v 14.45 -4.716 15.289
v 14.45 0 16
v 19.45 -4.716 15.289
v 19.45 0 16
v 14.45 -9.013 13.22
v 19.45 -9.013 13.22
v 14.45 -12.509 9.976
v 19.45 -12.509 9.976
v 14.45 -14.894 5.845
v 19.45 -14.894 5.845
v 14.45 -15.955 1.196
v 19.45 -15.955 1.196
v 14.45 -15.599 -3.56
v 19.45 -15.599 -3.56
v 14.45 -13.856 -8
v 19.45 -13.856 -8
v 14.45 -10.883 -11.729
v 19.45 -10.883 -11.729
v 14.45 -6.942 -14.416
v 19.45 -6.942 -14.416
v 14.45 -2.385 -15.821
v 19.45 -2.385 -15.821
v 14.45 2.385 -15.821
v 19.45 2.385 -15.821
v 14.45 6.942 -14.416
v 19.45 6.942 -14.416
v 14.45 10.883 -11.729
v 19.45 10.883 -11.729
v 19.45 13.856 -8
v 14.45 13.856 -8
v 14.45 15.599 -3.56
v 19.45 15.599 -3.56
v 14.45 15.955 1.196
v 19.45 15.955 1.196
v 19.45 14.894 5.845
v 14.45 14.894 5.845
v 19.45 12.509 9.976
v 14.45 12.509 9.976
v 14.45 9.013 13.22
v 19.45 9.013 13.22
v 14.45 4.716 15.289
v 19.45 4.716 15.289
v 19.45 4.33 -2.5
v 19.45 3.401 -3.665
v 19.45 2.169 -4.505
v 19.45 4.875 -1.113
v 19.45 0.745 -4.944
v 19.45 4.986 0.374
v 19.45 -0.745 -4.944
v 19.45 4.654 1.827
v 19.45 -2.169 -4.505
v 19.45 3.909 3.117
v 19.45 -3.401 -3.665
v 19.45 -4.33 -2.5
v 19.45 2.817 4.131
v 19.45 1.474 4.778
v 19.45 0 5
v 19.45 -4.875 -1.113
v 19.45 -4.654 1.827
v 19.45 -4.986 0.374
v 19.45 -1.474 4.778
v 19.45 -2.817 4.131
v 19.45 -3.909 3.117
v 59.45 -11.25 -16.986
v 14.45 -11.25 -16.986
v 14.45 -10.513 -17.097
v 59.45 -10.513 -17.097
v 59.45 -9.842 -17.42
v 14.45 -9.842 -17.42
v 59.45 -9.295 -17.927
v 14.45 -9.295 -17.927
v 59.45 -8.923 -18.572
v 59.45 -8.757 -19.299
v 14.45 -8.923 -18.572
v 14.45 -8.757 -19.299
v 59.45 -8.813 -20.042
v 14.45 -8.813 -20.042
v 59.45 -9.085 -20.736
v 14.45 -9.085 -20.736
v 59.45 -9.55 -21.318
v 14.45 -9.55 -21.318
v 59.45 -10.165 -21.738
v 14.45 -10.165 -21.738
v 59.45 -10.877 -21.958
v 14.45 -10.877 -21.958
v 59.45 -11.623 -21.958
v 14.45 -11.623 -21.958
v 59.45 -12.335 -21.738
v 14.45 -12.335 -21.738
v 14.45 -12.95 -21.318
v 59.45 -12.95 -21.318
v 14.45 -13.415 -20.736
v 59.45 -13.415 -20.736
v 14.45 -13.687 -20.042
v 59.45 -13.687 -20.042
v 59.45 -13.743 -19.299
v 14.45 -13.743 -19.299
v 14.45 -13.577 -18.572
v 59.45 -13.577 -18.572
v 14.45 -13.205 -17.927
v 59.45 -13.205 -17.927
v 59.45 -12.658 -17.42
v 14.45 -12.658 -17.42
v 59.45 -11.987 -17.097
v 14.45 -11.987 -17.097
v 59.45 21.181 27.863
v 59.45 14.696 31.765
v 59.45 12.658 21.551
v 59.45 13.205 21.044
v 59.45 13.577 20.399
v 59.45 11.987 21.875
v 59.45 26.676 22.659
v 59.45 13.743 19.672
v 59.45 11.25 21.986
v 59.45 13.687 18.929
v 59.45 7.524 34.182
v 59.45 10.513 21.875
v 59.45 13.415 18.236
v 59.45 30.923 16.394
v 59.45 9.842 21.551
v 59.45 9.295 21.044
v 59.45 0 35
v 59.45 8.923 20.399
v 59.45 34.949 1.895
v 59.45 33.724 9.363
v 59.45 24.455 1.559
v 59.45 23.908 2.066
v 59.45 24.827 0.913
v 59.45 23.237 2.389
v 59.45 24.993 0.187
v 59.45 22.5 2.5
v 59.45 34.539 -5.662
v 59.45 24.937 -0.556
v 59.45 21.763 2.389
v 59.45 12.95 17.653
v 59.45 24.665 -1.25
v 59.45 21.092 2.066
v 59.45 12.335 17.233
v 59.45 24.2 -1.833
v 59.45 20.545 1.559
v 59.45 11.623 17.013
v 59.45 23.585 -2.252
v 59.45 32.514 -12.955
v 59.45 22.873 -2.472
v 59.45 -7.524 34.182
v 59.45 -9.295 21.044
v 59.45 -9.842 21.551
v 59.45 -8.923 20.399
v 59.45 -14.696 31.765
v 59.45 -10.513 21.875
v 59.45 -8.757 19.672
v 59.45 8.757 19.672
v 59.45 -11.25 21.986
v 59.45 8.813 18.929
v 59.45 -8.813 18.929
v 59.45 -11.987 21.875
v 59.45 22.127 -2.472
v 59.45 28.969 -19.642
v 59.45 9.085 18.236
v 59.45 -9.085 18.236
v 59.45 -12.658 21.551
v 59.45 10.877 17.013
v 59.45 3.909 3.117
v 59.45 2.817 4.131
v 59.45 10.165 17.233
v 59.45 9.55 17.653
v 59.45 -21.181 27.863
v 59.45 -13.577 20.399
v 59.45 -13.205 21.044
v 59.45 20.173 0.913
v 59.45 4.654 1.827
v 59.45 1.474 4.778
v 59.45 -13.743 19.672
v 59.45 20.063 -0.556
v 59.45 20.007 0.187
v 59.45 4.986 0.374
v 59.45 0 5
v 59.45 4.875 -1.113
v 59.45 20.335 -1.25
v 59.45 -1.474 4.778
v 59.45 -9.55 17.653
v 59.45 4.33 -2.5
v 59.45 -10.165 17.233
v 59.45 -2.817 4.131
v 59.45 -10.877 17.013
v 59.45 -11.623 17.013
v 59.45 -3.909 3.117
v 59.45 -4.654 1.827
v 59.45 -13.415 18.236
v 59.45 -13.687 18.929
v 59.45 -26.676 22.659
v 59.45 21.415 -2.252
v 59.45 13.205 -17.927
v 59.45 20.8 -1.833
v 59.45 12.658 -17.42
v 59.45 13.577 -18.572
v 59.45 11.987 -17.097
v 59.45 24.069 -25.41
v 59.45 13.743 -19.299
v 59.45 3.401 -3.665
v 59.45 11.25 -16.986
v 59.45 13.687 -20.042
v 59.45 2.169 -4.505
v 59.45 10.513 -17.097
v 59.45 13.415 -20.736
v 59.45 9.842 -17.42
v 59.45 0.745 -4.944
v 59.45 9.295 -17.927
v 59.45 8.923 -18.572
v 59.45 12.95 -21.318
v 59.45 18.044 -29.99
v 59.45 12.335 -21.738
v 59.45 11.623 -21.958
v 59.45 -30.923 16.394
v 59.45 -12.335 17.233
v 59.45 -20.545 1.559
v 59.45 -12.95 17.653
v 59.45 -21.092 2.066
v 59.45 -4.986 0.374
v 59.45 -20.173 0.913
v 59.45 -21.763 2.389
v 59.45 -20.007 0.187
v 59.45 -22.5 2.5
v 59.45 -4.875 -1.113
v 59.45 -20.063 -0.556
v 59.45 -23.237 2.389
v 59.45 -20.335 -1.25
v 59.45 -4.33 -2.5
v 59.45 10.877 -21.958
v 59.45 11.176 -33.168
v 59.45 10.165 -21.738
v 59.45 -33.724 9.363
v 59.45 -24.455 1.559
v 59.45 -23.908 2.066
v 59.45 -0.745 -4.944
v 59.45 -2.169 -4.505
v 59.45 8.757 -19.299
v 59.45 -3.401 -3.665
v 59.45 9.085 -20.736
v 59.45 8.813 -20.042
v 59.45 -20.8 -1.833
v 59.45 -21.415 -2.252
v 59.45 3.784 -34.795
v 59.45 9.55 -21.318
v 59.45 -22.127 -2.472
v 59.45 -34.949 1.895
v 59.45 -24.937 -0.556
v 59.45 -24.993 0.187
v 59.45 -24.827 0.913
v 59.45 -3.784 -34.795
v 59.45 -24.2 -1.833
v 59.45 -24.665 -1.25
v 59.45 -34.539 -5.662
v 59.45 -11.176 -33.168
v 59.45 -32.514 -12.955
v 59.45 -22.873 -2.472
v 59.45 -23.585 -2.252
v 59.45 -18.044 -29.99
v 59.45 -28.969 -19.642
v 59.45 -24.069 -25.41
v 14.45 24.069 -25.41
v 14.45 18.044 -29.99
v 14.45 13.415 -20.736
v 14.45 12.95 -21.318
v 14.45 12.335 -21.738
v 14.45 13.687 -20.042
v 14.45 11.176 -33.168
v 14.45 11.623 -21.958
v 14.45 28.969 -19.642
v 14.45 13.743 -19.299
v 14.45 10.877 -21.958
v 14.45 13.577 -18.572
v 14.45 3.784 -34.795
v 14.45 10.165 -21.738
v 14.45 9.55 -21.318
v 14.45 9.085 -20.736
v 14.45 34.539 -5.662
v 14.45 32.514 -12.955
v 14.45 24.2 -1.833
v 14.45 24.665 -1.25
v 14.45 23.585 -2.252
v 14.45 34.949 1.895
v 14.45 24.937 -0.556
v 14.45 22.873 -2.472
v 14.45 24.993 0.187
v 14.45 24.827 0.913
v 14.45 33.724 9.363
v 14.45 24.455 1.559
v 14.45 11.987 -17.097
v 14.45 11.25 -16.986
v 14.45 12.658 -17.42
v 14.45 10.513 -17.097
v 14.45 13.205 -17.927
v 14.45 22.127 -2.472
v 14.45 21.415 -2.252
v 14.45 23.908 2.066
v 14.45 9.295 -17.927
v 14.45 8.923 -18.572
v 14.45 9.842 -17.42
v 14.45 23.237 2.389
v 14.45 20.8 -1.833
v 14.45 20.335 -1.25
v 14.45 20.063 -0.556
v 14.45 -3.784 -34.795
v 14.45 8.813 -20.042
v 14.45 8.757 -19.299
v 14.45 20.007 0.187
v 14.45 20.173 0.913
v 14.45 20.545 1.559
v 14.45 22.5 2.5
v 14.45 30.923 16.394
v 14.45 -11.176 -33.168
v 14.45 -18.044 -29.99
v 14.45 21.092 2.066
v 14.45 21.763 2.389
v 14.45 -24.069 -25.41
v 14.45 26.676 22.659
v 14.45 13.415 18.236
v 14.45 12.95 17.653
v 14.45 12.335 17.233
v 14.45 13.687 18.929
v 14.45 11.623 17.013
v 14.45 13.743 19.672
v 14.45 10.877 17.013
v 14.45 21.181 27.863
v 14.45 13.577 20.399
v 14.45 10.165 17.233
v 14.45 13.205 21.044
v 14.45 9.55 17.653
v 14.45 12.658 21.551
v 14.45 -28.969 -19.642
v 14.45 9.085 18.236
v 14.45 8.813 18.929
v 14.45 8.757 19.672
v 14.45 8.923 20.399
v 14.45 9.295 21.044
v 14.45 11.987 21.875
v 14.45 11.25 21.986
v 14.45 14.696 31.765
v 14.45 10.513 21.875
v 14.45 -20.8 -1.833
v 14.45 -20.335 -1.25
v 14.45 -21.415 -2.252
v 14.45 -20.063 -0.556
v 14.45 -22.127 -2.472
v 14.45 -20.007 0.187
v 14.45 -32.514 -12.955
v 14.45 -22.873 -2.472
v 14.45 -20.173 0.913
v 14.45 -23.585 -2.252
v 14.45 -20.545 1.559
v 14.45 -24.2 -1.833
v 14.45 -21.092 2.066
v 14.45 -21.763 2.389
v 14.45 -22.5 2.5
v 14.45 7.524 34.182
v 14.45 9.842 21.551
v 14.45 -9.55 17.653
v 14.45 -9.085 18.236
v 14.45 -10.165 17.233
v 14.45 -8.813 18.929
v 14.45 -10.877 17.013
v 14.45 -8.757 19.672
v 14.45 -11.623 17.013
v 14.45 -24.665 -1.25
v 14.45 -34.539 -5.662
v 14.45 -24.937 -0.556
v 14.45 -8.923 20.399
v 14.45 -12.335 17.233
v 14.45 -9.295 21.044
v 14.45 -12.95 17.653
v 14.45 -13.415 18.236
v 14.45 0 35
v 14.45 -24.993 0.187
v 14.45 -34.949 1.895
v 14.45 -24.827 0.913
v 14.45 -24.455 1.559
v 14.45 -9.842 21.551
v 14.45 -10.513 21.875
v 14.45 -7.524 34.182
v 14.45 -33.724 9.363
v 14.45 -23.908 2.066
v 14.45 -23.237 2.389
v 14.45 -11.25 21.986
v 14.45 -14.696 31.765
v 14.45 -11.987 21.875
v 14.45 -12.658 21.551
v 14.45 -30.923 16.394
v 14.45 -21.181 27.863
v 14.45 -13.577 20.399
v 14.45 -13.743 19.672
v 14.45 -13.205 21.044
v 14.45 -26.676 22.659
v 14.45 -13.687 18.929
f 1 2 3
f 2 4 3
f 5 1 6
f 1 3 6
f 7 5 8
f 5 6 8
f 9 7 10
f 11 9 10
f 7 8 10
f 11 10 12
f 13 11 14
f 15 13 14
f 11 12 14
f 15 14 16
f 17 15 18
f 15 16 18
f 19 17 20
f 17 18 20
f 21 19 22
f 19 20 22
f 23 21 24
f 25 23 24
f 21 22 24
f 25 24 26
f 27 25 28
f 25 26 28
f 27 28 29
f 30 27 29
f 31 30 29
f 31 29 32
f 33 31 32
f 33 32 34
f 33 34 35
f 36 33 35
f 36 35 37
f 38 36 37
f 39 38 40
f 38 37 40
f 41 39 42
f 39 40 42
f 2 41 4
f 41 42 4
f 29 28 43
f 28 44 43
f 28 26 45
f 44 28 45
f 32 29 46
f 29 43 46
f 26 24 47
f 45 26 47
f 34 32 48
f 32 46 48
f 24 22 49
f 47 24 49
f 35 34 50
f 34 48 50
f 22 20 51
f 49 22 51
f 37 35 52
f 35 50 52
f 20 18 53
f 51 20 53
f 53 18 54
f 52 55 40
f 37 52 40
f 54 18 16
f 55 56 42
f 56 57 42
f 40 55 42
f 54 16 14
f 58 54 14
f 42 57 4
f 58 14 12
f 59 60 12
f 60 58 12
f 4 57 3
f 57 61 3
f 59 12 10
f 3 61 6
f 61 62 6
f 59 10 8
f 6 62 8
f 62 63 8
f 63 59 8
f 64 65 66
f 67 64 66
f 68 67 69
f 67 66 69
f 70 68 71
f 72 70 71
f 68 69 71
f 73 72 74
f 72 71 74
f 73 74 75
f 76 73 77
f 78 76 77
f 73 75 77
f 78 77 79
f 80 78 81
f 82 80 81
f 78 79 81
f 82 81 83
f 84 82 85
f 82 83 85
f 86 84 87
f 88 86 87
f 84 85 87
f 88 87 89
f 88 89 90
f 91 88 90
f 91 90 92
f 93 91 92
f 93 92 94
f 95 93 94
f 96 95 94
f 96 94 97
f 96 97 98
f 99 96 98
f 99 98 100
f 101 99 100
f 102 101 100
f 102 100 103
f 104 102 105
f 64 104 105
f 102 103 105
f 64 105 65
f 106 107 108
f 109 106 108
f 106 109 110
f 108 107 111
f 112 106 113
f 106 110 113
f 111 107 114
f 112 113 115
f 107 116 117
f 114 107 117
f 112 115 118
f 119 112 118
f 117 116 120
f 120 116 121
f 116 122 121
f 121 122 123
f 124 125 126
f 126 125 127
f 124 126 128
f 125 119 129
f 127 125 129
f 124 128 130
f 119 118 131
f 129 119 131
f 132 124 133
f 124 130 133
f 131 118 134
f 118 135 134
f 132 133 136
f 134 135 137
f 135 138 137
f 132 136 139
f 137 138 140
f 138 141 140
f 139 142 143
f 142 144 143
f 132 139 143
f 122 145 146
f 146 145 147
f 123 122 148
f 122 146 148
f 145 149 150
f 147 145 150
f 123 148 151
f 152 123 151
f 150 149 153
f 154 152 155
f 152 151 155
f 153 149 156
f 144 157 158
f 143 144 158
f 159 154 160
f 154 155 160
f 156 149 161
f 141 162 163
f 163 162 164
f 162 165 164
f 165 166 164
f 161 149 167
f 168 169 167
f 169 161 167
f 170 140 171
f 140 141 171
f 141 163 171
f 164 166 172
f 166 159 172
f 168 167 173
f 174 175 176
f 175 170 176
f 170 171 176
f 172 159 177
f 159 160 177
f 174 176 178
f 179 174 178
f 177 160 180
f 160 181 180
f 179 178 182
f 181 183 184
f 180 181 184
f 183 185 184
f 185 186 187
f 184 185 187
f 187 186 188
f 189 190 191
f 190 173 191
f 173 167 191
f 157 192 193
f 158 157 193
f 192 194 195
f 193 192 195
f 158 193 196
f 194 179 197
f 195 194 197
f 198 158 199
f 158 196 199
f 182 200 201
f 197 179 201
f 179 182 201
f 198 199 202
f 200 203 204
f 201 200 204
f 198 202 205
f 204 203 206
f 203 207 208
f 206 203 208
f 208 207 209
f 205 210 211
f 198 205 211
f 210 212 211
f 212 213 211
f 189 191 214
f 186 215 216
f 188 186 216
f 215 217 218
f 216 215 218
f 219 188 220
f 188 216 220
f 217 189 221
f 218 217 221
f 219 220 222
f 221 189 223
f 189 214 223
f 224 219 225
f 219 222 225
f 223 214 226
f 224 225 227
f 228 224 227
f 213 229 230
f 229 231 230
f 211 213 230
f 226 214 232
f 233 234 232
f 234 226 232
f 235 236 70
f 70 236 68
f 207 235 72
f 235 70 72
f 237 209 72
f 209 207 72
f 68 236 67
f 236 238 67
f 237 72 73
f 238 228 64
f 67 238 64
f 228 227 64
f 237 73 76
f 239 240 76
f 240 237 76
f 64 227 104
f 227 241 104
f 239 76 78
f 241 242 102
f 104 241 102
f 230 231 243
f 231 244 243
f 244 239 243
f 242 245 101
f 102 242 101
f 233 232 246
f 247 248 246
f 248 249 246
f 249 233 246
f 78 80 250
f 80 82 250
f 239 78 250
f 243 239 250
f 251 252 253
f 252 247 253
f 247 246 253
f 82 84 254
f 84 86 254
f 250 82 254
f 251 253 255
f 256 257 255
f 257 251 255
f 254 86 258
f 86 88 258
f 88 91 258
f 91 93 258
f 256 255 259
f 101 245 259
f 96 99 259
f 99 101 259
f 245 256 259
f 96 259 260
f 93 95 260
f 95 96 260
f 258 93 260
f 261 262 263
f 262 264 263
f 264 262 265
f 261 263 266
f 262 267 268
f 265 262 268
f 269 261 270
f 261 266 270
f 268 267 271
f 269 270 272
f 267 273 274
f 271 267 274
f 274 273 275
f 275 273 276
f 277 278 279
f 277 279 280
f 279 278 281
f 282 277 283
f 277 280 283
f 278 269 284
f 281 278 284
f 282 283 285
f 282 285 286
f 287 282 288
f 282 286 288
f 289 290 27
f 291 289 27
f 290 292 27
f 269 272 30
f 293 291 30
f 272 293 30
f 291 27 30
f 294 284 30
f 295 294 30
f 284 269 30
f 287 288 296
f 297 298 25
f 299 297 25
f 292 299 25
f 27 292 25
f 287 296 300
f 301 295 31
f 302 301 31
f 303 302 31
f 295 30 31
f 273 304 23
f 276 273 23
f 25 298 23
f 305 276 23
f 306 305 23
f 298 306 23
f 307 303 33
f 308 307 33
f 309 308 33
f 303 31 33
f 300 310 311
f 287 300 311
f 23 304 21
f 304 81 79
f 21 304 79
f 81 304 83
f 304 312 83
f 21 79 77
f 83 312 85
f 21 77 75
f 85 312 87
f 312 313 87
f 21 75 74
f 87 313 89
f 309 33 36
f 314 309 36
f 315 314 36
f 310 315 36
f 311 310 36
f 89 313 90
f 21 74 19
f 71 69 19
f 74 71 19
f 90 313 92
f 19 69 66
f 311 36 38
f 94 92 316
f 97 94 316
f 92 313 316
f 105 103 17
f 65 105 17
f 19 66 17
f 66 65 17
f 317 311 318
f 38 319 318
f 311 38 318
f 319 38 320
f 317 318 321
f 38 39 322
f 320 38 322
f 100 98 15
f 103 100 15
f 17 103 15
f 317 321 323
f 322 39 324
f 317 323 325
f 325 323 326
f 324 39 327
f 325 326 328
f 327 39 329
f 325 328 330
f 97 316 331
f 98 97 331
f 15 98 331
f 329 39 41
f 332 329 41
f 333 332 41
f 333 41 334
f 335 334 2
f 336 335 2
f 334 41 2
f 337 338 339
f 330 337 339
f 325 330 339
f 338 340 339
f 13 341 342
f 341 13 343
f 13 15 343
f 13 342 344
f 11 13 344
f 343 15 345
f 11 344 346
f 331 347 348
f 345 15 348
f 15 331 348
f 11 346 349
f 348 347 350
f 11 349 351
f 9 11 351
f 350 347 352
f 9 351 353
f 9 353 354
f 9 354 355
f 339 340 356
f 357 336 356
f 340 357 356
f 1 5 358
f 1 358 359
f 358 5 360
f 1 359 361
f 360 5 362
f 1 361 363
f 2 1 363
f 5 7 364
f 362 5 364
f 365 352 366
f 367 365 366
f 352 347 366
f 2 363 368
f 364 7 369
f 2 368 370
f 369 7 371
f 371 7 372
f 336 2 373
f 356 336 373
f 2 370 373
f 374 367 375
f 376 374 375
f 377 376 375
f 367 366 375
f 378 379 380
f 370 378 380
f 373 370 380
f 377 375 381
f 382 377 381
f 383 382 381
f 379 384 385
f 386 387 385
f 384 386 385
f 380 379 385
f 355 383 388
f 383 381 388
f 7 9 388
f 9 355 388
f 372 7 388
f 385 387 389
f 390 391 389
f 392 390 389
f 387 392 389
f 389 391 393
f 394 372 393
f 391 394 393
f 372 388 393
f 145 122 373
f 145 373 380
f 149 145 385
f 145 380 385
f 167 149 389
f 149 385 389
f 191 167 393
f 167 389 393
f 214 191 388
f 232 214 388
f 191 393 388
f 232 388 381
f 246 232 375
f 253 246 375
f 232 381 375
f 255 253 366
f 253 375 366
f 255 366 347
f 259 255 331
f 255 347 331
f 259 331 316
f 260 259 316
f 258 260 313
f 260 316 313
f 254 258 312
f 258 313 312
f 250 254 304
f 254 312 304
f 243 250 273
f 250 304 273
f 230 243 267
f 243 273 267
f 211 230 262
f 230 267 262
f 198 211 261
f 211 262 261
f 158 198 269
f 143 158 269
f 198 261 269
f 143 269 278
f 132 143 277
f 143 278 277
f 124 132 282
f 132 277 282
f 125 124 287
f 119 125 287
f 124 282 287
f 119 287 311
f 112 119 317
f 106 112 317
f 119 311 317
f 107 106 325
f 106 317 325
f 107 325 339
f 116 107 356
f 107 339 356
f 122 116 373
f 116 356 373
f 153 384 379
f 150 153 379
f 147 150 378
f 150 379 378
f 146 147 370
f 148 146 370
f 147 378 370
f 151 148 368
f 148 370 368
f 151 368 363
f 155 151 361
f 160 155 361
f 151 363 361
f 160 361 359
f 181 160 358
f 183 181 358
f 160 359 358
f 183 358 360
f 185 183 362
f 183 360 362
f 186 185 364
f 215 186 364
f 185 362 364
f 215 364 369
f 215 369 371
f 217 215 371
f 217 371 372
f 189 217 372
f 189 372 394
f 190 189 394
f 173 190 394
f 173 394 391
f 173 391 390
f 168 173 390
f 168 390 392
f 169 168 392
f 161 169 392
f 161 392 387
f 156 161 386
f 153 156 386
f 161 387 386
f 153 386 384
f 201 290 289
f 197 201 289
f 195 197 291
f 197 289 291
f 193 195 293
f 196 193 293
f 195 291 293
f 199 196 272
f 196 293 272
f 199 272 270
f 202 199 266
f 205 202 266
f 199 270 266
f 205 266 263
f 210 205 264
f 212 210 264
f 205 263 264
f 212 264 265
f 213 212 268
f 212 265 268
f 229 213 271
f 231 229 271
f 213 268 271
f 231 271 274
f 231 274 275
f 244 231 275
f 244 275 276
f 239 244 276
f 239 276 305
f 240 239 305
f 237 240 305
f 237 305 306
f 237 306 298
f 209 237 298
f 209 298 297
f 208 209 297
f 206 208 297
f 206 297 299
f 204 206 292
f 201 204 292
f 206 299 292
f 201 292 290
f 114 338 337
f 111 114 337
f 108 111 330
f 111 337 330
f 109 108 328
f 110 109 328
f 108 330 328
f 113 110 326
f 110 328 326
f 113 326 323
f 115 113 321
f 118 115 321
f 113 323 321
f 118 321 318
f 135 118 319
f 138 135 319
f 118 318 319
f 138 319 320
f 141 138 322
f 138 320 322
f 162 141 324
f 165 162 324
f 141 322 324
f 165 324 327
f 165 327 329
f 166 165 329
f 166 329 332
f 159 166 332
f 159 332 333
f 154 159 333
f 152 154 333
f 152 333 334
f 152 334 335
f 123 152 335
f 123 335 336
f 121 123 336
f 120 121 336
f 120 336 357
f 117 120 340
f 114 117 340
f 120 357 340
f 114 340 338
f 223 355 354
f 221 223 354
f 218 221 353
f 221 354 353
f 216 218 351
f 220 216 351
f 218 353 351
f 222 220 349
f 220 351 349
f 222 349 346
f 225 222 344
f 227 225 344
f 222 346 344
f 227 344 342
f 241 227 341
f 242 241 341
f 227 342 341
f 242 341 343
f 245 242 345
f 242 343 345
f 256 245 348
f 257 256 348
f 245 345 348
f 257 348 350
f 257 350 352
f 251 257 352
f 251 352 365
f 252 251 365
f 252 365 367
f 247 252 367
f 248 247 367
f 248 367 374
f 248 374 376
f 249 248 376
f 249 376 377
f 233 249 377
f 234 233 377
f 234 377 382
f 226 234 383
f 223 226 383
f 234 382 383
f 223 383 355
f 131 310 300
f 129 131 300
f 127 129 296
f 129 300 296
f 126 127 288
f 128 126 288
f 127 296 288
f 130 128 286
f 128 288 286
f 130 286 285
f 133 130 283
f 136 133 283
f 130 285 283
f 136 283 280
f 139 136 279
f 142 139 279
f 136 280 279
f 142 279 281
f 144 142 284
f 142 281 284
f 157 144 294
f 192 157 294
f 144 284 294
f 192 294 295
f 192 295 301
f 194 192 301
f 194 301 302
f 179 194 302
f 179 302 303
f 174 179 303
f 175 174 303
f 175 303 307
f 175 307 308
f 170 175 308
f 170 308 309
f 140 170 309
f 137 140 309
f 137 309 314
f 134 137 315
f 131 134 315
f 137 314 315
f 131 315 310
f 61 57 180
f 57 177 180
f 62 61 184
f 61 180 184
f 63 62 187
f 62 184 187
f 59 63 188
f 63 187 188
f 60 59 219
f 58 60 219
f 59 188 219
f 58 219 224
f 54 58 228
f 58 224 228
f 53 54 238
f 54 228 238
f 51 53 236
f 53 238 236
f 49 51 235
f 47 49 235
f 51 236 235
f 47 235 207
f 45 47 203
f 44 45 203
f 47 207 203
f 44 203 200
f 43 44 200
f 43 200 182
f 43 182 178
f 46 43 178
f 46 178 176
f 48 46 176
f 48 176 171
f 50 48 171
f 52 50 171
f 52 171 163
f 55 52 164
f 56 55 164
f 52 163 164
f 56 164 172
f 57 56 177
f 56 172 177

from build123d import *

# Parameters (mm, degrees)
SKETCH2_R          = 2.5
CUT_EXTRUDE1_DEPTH = 45


with BuildPart() as part:
    # Sketch1 → Revolve1 (revolve)
    with BuildSketch(Plane.XY, mode=Mode.PRIVATE) as revolve1_sk:
        Polygon((14.45, 35), (14.45, 16), (19.45, 16), (19.45, 5), (59.45, 5), (59.45, 35), align=None)
    revolve(revolve1_sk.sketch.rotate(Axis((0, 0, 0), (1, 0, 0)), 90), axis=Axis((0, 0, 0), (1, 0, 0)))

    # Sketch2 → Cut-Extrude1 (cut)
    with BuildSketch(Plane.ZY.offset(-14.45)):
        with Locations((19.485571585, 11.25)):
            Circle(SKETCH2_R)
        with Locations((19.485571585, -11.25)):
            Circle(SKETCH2_R)
        with Locations((0, -22.5)):
            Circle(SKETCH2_R)
        with Locations((-19.485571585, -11.25)):
            Circle(SKETCH2_R)
        with Locations((-19.485571585, 11.25)):
            Circle(SKETCH2_R)
        with Locations((0, 22.5)):
            Circle(SKETCH2_R)
    extrude(amount=-CUT_EXTRUDE1_DEPTH, mode=Mode.SUBTRACT)


solid = part.part
